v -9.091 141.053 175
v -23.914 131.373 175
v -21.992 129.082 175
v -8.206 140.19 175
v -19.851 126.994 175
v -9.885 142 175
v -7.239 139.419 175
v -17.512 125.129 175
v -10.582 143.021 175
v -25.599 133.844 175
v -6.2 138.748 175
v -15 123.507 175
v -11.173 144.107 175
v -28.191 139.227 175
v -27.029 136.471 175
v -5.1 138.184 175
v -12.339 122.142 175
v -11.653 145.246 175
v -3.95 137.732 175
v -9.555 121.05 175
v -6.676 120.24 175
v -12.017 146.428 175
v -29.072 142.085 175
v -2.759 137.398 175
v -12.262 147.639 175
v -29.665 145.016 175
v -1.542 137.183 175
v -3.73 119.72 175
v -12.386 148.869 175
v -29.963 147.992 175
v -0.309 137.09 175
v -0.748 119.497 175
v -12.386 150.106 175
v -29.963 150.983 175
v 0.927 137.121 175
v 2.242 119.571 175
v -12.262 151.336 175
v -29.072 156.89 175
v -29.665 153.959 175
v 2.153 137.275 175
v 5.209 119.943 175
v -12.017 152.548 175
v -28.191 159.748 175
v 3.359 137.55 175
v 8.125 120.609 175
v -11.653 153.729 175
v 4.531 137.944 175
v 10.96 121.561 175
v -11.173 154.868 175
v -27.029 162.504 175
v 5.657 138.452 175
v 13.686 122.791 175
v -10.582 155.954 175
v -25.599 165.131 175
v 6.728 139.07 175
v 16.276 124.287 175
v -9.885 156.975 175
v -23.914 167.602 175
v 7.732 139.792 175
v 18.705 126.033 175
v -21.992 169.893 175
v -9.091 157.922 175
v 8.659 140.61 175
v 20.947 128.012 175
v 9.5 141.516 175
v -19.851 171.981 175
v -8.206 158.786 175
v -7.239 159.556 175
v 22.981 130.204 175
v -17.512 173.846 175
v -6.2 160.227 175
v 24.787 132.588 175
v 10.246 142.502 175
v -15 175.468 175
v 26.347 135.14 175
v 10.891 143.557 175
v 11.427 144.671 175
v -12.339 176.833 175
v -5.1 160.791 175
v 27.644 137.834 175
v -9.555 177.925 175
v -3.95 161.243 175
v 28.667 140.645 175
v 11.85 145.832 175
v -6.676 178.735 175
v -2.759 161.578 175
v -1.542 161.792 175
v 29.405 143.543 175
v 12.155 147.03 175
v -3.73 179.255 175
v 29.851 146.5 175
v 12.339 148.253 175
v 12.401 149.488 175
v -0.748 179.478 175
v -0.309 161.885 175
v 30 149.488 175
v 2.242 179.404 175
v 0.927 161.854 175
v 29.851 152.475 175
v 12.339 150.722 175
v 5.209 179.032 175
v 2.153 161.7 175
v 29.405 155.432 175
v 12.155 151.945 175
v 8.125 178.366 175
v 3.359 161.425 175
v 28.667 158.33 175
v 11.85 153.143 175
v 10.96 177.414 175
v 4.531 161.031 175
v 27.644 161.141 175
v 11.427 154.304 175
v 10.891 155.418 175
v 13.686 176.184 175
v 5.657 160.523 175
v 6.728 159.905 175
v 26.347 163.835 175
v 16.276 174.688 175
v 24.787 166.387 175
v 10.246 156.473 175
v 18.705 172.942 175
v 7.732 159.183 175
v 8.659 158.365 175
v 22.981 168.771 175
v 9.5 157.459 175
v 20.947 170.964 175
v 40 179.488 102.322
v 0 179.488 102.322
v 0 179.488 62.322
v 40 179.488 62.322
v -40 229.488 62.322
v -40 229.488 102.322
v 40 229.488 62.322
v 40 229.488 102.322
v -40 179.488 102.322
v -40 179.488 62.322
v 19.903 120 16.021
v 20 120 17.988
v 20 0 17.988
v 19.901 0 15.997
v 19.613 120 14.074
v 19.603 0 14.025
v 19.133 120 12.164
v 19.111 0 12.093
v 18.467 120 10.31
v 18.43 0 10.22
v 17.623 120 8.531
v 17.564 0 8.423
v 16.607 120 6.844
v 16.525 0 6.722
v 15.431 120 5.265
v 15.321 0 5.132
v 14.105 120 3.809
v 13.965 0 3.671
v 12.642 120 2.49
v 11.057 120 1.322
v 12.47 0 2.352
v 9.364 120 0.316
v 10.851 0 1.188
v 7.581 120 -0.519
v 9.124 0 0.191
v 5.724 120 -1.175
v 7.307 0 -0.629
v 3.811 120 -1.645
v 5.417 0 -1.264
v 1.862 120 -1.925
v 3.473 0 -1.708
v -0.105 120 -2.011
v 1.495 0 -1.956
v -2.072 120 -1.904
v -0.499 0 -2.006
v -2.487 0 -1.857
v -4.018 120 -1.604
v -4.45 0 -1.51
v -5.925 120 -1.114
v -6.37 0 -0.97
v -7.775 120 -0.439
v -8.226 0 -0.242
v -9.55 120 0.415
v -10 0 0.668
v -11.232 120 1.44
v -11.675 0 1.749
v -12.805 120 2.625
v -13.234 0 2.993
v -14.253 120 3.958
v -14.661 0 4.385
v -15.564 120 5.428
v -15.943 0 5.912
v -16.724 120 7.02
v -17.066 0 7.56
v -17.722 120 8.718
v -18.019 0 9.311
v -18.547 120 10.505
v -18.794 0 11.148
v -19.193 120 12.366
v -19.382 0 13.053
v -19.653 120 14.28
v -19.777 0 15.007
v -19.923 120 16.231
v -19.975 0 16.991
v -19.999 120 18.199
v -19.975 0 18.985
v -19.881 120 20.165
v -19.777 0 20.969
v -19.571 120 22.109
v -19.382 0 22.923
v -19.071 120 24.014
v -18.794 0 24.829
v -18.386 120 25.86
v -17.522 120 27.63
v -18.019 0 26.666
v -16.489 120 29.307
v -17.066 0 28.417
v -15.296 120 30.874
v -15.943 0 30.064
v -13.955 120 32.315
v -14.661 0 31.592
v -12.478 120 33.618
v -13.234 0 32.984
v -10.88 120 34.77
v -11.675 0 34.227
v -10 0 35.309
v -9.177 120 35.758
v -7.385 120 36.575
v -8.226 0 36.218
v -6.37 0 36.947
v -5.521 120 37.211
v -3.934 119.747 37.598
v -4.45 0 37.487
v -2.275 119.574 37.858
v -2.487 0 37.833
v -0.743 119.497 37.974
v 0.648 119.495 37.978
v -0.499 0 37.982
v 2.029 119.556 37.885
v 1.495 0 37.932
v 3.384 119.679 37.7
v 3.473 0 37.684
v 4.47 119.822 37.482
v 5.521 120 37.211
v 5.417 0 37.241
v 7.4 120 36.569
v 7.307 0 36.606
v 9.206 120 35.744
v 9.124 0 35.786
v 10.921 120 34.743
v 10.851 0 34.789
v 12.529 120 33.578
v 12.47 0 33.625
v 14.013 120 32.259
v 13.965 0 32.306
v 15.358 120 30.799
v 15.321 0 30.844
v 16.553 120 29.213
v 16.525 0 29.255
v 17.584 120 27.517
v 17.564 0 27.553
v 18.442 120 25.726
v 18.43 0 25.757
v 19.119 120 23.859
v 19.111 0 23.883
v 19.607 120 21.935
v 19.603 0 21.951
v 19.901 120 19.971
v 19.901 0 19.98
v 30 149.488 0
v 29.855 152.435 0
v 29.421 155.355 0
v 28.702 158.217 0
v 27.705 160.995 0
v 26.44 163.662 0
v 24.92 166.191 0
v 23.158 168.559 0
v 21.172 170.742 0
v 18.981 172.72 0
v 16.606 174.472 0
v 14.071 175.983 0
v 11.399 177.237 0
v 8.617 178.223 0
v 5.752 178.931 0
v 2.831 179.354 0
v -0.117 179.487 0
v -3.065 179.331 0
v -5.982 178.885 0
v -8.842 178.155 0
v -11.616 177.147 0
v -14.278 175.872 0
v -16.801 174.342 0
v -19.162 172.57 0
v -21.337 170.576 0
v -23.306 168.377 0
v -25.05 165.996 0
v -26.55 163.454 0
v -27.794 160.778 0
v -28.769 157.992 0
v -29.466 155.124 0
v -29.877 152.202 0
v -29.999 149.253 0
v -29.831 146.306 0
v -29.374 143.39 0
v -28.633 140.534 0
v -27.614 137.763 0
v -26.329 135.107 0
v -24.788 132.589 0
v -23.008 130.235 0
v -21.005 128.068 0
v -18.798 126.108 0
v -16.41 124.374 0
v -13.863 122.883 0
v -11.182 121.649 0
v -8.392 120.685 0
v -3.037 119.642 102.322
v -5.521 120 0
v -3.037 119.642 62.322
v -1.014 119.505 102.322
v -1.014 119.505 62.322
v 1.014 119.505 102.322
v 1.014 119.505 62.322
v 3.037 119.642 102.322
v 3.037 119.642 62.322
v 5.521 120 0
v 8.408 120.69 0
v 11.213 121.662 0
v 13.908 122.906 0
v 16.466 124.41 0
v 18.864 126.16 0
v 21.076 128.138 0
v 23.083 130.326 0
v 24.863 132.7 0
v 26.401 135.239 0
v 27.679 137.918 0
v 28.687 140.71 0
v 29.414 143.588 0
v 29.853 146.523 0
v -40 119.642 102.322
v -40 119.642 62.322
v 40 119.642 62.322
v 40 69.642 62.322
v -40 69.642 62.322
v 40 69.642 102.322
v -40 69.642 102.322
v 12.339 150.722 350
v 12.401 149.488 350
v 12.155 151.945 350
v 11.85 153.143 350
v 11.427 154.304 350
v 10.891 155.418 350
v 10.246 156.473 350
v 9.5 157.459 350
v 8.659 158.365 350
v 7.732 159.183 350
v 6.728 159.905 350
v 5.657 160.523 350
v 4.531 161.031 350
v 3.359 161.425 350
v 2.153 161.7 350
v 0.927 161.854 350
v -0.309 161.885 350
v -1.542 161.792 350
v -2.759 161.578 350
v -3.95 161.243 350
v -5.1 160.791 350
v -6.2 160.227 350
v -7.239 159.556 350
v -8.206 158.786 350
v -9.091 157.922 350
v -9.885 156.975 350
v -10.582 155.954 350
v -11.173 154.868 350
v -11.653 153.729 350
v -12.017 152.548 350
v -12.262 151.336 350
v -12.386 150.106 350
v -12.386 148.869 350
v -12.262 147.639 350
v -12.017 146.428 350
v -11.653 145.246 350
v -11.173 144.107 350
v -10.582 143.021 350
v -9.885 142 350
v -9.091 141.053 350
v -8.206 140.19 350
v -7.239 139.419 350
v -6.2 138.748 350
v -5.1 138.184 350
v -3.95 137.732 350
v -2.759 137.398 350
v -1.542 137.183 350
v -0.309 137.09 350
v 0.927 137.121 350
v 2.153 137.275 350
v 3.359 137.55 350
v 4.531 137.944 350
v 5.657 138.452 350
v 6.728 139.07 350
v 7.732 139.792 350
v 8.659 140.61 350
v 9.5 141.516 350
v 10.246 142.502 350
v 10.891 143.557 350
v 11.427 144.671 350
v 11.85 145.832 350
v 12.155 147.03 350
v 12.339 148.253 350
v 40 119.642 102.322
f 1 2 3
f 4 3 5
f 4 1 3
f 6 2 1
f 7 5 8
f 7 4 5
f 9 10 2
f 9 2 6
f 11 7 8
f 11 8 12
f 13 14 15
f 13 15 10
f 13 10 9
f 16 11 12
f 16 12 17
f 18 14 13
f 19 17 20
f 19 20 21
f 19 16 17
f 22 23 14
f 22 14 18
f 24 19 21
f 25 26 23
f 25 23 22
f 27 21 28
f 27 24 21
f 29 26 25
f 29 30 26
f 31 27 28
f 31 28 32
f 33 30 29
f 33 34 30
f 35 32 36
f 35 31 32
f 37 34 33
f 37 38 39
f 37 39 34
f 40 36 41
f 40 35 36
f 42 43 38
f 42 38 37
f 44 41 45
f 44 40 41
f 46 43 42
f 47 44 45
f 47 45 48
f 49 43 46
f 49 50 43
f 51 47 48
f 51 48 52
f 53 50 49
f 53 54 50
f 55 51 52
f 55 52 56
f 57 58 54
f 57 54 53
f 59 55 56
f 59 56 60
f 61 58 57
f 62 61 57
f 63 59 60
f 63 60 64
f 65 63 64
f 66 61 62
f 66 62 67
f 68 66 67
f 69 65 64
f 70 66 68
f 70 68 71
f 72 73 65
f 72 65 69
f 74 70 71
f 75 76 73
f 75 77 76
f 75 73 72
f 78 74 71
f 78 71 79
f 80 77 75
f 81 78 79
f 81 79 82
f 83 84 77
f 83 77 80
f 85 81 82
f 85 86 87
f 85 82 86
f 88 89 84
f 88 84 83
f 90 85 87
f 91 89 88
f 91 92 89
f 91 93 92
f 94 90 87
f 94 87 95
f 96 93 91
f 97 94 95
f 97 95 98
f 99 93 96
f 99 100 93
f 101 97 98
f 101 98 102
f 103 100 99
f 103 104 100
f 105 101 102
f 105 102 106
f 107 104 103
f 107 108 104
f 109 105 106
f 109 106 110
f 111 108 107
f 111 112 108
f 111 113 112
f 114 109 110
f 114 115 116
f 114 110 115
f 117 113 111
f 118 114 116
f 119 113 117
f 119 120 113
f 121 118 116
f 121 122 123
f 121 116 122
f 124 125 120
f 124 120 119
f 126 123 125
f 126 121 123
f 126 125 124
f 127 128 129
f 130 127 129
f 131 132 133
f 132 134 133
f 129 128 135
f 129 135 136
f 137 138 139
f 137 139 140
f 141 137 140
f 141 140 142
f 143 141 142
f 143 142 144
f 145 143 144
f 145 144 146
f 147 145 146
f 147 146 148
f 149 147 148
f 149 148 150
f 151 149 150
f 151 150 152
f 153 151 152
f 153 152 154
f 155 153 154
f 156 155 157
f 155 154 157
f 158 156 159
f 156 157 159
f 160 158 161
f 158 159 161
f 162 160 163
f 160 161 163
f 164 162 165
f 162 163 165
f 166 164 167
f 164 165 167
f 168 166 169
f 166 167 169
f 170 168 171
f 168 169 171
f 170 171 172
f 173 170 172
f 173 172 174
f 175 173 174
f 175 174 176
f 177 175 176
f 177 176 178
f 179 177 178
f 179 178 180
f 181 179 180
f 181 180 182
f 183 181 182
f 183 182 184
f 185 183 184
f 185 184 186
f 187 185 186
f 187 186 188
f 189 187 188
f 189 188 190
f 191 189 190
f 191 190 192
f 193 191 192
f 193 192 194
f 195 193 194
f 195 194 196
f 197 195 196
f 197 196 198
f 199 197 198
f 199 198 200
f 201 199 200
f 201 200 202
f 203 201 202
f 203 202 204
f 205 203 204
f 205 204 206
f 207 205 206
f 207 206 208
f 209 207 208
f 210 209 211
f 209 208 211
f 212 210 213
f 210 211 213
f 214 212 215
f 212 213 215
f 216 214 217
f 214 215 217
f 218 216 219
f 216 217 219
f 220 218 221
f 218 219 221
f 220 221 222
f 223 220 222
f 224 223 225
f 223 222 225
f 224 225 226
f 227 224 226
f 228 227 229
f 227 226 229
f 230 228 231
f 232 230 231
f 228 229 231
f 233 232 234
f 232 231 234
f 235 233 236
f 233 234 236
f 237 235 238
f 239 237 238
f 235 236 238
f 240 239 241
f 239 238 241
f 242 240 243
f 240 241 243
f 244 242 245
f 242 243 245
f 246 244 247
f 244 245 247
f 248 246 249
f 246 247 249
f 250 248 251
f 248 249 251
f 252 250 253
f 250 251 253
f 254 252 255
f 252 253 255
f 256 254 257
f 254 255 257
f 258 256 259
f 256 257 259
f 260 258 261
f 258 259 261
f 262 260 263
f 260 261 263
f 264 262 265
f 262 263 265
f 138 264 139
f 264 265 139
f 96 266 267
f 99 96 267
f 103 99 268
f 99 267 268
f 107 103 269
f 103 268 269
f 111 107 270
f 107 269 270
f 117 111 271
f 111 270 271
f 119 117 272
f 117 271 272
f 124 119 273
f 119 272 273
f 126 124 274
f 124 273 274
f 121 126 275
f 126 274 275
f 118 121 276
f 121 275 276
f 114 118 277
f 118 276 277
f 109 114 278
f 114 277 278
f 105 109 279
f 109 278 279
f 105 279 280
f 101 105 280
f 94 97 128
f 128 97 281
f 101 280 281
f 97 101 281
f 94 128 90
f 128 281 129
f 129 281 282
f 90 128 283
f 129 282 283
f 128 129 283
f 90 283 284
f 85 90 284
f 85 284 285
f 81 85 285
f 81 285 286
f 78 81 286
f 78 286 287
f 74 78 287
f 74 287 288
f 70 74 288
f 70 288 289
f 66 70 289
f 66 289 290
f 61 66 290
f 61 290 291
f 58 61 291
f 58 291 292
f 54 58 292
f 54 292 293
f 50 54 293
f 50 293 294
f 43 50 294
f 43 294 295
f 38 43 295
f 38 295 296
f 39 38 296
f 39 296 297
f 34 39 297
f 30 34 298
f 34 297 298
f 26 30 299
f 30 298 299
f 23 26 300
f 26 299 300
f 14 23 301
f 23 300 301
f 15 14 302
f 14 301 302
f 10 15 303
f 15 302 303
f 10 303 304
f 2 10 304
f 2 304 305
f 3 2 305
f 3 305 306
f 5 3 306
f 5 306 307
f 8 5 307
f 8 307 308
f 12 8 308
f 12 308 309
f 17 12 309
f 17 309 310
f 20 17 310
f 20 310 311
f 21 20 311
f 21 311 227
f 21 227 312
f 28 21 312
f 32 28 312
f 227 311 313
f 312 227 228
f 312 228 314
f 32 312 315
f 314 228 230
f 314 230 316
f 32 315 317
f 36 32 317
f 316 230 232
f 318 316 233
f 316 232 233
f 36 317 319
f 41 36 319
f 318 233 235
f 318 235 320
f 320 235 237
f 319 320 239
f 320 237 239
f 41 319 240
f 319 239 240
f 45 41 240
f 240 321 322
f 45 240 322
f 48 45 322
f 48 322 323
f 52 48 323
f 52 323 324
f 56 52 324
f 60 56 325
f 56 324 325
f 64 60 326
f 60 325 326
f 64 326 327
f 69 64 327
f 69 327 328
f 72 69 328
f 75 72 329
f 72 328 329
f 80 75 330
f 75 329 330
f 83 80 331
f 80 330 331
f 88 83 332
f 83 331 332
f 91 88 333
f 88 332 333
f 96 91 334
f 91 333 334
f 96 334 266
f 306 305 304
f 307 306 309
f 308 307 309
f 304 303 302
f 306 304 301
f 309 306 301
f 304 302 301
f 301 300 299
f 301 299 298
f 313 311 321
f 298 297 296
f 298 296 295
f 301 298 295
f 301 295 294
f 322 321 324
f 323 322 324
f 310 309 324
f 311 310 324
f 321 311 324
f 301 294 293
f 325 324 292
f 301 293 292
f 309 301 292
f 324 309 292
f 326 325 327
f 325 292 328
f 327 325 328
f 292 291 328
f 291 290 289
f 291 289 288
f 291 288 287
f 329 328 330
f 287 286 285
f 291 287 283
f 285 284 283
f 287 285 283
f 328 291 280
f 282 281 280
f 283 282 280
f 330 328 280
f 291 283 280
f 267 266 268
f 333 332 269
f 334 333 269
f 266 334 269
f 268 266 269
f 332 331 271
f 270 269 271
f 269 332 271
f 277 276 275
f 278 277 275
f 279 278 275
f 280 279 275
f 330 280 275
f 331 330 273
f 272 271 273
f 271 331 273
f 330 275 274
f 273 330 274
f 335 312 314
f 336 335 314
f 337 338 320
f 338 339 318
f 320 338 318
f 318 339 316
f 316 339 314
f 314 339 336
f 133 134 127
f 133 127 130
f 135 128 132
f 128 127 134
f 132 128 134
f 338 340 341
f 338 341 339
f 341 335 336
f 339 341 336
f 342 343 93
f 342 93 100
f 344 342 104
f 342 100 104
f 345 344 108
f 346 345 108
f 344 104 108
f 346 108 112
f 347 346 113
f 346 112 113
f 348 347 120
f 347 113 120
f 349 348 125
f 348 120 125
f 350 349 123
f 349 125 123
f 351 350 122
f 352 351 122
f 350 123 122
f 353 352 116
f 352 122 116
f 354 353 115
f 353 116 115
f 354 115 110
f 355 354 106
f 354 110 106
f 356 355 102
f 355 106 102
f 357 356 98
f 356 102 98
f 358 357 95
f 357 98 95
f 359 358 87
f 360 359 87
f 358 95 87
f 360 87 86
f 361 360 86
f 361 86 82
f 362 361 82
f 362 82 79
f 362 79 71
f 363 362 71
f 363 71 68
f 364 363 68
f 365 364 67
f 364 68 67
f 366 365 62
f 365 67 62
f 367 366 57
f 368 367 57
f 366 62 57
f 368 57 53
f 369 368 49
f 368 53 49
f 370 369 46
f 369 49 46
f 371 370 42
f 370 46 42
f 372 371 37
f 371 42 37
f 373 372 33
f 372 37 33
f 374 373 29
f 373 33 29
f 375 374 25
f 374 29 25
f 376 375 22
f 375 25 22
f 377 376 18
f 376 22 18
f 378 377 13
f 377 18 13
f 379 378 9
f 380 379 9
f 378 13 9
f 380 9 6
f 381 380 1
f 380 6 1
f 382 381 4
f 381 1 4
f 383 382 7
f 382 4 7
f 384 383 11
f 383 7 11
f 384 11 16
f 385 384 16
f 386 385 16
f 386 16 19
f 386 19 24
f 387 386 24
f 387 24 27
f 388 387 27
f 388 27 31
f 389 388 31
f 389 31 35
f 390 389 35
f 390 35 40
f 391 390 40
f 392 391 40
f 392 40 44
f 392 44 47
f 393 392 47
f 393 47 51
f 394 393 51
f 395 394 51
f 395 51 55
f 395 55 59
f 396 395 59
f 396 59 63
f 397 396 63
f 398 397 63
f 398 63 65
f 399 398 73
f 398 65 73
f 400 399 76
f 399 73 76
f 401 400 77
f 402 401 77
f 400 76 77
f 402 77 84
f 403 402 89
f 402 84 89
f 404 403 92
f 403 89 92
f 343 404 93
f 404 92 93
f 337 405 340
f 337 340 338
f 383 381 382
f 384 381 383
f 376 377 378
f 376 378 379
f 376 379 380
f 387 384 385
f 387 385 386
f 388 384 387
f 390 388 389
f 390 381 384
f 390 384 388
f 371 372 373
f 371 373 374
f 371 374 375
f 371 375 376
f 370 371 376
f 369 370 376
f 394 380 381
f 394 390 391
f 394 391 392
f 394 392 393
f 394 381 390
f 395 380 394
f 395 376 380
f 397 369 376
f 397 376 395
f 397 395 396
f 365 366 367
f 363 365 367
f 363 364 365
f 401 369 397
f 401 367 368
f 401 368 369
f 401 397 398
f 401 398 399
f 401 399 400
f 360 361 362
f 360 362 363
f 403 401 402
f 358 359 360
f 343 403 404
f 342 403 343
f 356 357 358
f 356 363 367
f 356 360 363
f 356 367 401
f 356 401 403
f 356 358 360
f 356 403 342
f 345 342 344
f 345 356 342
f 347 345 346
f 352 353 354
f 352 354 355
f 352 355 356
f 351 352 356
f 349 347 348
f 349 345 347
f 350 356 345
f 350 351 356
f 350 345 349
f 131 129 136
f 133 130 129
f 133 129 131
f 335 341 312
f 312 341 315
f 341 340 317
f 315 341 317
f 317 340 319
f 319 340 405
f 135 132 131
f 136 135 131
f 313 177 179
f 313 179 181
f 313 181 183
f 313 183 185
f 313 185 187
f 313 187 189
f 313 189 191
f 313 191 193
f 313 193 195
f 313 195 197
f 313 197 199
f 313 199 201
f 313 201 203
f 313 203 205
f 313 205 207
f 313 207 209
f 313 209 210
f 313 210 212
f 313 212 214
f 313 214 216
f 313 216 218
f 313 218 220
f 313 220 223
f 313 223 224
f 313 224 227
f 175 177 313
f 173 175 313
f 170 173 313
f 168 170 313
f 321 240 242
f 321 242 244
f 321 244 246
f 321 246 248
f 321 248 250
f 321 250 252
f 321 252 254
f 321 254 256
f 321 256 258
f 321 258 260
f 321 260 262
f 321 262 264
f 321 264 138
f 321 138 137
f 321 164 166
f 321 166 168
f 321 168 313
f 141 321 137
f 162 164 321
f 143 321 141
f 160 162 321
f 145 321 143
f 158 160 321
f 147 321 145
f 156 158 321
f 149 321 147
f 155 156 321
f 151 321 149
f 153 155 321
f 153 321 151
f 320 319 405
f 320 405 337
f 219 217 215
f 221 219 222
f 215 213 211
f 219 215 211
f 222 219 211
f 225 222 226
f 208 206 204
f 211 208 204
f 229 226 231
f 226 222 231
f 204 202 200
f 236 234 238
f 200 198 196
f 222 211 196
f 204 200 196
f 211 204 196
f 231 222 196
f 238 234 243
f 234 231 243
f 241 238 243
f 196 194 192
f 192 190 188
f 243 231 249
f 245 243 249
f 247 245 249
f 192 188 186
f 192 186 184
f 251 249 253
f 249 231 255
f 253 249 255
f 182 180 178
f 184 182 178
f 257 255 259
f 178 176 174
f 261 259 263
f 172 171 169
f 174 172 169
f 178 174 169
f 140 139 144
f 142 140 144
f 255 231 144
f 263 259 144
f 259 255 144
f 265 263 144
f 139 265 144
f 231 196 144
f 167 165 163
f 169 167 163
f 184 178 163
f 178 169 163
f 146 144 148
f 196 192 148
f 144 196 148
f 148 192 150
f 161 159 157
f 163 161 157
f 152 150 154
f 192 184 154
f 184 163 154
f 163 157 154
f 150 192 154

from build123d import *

# Parameters (mm, degrees)
SKETCH1_R                = 20
BOSS_EXTRUDE1_DEPTH      = 120
SKETCH2_R                = 30
BOSS_EXTRUDE2_DEPTH      = 175
SKETCH3_R                = 12.400920413
BOSS_EXTRUDE3_DEPTH      = 175
BOSS_EXTRUDE4_DEPTH      = 40
BOSS_EXTRUDE4_DEPTH_BACK = 40
SKETCH4_W                = 40
SKETCH4_H                = 50


with BuildPart() as part:
    # Sketch1 → Boss-Extrude1 (new body)
    with BuildSketch(Plane(origin=(0, 0, 17.988233235), x_dir=(1, 0, 0), z_dir=(0, 1, 0))):
        Circle(SKETCH1_R)
    extrude(amount=BOSS_EXTRUDE1_DEPTH)

    # Sketch2 → Boss-Extrude2 (add)
    with BuildSketch(Plane.XY):
        with Locations((0, 149.487531085)):
            Circle(SKETCH2_R)
    extrude(amount=BOSS_EXTRUDE2_DEPTH)

    # Sketch3 → Boss-Extrude3 (add)
    with BuildSketch(Plane.XY.offset(175)):
        with Locations((0, 149.487531085)):
            Circle(SKETCH3_R)
    extrude(amount=BOSS_EXTRUDE3_DEPTH)

    # Sketch4 → Boss-Extrude4 (add, two sides: drawn at the far end of the back side and taken through both)
    with BuildSketch(Plane(origin=(0, 0, 0), x_dir=(0, 0, -1), z_dir=(1, 0, 0)).offset(-BOSS_EXTRUDE4_DEPTH_BACK)):
        with Locations((-82.321831747, 94.641687433)):
            Rectangle(SKETCH4_W, SKETCH4_H)
        with Locations((-82.321831747, 204.487531085)):
            Rectangle(SKETCH4_W, SKETCH4_H)
    extrude(amount=BOSS_EXTRUDE4_DEPTH + BOSS_EXTRUDE4_DEPTH_BACK)


with BuildPart() as boss_extrude4_piece_1:
    # of the separate pieces the step leaves, piece 1, a body of its own (boss_extrude4_pieces)
    add(part.part.solids().sort_by_distance((20, 0, 17.988233235))[0])


with BuildPart() as boss_extrude4_piece_2:
    # of the separate pieces the step leaves, piece 2, a body of its own (boss_extrude4_pieces)
    add(part.part.solids().sort_by_distance((40, 179.487531085, 102.321831747))[0])


solid = Compound([boss_extrude4_piece_1.part, boss_extrude4_piece_2.part])
